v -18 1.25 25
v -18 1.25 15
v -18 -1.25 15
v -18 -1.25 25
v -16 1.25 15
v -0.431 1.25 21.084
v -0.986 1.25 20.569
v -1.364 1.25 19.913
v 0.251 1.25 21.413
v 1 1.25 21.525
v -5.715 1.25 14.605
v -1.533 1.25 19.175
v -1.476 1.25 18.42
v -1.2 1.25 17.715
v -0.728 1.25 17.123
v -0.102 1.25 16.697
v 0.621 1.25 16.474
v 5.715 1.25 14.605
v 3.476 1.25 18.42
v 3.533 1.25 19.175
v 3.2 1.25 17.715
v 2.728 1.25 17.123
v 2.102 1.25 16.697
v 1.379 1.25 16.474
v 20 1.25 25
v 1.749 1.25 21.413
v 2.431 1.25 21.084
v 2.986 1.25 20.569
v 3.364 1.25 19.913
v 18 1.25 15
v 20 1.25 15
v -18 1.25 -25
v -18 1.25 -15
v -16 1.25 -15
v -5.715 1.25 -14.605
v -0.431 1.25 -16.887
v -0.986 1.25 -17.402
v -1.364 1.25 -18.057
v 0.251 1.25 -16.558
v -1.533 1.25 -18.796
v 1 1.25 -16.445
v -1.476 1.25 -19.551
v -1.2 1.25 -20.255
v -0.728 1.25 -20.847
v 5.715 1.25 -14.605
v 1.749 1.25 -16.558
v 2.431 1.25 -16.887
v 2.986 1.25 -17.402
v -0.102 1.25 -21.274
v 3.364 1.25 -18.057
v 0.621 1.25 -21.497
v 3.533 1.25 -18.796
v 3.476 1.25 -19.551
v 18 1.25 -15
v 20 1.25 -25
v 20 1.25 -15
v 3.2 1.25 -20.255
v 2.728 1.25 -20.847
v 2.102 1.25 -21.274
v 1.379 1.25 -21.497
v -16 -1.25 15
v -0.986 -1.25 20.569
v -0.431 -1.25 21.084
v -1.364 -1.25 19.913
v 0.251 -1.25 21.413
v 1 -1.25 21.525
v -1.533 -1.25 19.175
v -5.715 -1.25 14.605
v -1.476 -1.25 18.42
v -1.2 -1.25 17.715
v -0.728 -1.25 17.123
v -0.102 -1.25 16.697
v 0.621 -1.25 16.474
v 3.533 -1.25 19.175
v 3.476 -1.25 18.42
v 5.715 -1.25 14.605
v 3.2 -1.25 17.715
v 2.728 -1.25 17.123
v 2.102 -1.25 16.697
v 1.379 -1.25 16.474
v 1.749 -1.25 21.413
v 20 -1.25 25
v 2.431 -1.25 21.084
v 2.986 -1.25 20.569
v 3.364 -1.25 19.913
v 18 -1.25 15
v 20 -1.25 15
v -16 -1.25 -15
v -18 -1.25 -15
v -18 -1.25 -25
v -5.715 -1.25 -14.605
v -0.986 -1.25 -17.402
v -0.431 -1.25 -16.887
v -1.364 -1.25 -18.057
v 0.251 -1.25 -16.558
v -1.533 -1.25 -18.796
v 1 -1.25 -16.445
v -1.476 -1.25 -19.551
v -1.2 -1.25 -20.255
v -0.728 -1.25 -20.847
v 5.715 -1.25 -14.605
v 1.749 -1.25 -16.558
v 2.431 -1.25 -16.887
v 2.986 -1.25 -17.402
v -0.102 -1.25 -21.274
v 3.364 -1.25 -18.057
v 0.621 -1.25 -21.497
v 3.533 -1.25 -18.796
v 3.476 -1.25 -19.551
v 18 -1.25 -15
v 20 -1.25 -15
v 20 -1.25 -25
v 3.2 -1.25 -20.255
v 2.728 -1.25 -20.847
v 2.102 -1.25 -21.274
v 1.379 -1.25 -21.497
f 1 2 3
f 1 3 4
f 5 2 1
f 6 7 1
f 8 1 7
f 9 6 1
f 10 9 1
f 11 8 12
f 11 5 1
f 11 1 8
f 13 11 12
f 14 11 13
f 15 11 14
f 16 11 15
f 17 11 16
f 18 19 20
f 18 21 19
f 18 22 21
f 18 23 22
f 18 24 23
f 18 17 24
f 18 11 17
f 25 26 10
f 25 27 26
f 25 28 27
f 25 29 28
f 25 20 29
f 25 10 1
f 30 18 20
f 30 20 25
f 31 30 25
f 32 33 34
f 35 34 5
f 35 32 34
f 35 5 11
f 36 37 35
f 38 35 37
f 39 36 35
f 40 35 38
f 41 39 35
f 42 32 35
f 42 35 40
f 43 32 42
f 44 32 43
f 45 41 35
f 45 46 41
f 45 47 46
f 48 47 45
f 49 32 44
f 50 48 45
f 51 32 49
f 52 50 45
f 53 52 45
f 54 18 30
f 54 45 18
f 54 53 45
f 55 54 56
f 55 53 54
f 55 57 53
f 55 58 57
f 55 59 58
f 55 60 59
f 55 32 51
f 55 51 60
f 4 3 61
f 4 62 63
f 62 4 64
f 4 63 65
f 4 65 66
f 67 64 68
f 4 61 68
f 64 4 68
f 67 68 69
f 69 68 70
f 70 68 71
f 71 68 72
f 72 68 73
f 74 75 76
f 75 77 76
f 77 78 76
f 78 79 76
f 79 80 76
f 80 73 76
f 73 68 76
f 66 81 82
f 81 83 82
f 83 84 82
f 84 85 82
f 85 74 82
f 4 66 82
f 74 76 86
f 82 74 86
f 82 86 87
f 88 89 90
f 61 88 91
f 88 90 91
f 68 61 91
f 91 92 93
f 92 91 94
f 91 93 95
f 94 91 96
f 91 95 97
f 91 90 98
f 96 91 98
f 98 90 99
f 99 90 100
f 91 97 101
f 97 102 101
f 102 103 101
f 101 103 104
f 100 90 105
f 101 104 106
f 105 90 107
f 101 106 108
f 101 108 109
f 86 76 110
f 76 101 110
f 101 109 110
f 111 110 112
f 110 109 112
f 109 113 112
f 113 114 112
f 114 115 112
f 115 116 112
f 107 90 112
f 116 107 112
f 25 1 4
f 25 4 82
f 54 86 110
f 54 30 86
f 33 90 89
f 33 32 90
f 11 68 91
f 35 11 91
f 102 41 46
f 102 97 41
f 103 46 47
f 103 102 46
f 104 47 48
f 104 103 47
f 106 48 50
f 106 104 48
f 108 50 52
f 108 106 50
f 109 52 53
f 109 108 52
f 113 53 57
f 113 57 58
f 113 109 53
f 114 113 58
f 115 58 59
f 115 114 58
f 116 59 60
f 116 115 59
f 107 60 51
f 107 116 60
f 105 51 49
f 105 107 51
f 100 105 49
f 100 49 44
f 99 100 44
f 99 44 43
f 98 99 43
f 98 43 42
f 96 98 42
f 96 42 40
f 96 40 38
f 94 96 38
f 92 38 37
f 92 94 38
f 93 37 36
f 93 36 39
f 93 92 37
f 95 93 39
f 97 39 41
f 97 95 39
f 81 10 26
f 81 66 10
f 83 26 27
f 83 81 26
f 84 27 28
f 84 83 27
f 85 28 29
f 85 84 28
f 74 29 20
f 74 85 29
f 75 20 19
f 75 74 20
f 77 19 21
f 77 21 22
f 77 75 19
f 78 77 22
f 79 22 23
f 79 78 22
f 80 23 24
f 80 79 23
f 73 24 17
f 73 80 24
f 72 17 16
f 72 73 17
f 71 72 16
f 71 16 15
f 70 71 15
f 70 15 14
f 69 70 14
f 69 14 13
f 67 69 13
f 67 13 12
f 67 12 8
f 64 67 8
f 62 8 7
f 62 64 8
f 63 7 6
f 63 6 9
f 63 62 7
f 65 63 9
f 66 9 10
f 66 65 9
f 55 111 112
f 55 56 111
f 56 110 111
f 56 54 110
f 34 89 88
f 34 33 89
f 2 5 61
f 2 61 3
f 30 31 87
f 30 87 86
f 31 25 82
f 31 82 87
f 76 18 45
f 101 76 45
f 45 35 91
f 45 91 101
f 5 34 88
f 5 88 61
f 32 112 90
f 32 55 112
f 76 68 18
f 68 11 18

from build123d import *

# Parameters (mm, degrees)
SCHIZZO2_R                   = 2.54
SCHIZZO2_W                   = 11.43
SCHIZZO2_H                   = 29.21
ESTRUSIONE_ESTRUSIONE1_DEPTH = 1.25


with BuildPart() as part:
    # Schizzo2 → Estrusione-Estrusione1 (new, symmetric)
    with BuildSketch(Plane(origin=(0, 0, 0), x_dir=(1, 0, 0), z_dir=(0, 1, 0))):
        Polygon((-18, 15), (-16, 15), (-16, -15), (-18, -15), (-18, -25), (20, -25), (20, -15), (18, -15), (18, 15), (20, 15), (20, 25), (-18, 25), align=None)
        with Locations(Location((1, 18.985370086, 0), (0, 0, 270))):
            Circle(SCHIZZO2_R, mode=Mode.SUBTRACT)
        with Locations(Location((1, -18.985370086, 0), (0, 0, 270))):
            Circle(SCHIZZO2_R, mode=Mode.SUBTRACT)
        Rectangle(SCHIZZO2_W, SCHIZZO2_H, mode=Mode.SUBTRACT)
    extrude(amount=ESTRUSIONE_ESTRUSIONE1_DEPTH, both=True)


solid = part.part
